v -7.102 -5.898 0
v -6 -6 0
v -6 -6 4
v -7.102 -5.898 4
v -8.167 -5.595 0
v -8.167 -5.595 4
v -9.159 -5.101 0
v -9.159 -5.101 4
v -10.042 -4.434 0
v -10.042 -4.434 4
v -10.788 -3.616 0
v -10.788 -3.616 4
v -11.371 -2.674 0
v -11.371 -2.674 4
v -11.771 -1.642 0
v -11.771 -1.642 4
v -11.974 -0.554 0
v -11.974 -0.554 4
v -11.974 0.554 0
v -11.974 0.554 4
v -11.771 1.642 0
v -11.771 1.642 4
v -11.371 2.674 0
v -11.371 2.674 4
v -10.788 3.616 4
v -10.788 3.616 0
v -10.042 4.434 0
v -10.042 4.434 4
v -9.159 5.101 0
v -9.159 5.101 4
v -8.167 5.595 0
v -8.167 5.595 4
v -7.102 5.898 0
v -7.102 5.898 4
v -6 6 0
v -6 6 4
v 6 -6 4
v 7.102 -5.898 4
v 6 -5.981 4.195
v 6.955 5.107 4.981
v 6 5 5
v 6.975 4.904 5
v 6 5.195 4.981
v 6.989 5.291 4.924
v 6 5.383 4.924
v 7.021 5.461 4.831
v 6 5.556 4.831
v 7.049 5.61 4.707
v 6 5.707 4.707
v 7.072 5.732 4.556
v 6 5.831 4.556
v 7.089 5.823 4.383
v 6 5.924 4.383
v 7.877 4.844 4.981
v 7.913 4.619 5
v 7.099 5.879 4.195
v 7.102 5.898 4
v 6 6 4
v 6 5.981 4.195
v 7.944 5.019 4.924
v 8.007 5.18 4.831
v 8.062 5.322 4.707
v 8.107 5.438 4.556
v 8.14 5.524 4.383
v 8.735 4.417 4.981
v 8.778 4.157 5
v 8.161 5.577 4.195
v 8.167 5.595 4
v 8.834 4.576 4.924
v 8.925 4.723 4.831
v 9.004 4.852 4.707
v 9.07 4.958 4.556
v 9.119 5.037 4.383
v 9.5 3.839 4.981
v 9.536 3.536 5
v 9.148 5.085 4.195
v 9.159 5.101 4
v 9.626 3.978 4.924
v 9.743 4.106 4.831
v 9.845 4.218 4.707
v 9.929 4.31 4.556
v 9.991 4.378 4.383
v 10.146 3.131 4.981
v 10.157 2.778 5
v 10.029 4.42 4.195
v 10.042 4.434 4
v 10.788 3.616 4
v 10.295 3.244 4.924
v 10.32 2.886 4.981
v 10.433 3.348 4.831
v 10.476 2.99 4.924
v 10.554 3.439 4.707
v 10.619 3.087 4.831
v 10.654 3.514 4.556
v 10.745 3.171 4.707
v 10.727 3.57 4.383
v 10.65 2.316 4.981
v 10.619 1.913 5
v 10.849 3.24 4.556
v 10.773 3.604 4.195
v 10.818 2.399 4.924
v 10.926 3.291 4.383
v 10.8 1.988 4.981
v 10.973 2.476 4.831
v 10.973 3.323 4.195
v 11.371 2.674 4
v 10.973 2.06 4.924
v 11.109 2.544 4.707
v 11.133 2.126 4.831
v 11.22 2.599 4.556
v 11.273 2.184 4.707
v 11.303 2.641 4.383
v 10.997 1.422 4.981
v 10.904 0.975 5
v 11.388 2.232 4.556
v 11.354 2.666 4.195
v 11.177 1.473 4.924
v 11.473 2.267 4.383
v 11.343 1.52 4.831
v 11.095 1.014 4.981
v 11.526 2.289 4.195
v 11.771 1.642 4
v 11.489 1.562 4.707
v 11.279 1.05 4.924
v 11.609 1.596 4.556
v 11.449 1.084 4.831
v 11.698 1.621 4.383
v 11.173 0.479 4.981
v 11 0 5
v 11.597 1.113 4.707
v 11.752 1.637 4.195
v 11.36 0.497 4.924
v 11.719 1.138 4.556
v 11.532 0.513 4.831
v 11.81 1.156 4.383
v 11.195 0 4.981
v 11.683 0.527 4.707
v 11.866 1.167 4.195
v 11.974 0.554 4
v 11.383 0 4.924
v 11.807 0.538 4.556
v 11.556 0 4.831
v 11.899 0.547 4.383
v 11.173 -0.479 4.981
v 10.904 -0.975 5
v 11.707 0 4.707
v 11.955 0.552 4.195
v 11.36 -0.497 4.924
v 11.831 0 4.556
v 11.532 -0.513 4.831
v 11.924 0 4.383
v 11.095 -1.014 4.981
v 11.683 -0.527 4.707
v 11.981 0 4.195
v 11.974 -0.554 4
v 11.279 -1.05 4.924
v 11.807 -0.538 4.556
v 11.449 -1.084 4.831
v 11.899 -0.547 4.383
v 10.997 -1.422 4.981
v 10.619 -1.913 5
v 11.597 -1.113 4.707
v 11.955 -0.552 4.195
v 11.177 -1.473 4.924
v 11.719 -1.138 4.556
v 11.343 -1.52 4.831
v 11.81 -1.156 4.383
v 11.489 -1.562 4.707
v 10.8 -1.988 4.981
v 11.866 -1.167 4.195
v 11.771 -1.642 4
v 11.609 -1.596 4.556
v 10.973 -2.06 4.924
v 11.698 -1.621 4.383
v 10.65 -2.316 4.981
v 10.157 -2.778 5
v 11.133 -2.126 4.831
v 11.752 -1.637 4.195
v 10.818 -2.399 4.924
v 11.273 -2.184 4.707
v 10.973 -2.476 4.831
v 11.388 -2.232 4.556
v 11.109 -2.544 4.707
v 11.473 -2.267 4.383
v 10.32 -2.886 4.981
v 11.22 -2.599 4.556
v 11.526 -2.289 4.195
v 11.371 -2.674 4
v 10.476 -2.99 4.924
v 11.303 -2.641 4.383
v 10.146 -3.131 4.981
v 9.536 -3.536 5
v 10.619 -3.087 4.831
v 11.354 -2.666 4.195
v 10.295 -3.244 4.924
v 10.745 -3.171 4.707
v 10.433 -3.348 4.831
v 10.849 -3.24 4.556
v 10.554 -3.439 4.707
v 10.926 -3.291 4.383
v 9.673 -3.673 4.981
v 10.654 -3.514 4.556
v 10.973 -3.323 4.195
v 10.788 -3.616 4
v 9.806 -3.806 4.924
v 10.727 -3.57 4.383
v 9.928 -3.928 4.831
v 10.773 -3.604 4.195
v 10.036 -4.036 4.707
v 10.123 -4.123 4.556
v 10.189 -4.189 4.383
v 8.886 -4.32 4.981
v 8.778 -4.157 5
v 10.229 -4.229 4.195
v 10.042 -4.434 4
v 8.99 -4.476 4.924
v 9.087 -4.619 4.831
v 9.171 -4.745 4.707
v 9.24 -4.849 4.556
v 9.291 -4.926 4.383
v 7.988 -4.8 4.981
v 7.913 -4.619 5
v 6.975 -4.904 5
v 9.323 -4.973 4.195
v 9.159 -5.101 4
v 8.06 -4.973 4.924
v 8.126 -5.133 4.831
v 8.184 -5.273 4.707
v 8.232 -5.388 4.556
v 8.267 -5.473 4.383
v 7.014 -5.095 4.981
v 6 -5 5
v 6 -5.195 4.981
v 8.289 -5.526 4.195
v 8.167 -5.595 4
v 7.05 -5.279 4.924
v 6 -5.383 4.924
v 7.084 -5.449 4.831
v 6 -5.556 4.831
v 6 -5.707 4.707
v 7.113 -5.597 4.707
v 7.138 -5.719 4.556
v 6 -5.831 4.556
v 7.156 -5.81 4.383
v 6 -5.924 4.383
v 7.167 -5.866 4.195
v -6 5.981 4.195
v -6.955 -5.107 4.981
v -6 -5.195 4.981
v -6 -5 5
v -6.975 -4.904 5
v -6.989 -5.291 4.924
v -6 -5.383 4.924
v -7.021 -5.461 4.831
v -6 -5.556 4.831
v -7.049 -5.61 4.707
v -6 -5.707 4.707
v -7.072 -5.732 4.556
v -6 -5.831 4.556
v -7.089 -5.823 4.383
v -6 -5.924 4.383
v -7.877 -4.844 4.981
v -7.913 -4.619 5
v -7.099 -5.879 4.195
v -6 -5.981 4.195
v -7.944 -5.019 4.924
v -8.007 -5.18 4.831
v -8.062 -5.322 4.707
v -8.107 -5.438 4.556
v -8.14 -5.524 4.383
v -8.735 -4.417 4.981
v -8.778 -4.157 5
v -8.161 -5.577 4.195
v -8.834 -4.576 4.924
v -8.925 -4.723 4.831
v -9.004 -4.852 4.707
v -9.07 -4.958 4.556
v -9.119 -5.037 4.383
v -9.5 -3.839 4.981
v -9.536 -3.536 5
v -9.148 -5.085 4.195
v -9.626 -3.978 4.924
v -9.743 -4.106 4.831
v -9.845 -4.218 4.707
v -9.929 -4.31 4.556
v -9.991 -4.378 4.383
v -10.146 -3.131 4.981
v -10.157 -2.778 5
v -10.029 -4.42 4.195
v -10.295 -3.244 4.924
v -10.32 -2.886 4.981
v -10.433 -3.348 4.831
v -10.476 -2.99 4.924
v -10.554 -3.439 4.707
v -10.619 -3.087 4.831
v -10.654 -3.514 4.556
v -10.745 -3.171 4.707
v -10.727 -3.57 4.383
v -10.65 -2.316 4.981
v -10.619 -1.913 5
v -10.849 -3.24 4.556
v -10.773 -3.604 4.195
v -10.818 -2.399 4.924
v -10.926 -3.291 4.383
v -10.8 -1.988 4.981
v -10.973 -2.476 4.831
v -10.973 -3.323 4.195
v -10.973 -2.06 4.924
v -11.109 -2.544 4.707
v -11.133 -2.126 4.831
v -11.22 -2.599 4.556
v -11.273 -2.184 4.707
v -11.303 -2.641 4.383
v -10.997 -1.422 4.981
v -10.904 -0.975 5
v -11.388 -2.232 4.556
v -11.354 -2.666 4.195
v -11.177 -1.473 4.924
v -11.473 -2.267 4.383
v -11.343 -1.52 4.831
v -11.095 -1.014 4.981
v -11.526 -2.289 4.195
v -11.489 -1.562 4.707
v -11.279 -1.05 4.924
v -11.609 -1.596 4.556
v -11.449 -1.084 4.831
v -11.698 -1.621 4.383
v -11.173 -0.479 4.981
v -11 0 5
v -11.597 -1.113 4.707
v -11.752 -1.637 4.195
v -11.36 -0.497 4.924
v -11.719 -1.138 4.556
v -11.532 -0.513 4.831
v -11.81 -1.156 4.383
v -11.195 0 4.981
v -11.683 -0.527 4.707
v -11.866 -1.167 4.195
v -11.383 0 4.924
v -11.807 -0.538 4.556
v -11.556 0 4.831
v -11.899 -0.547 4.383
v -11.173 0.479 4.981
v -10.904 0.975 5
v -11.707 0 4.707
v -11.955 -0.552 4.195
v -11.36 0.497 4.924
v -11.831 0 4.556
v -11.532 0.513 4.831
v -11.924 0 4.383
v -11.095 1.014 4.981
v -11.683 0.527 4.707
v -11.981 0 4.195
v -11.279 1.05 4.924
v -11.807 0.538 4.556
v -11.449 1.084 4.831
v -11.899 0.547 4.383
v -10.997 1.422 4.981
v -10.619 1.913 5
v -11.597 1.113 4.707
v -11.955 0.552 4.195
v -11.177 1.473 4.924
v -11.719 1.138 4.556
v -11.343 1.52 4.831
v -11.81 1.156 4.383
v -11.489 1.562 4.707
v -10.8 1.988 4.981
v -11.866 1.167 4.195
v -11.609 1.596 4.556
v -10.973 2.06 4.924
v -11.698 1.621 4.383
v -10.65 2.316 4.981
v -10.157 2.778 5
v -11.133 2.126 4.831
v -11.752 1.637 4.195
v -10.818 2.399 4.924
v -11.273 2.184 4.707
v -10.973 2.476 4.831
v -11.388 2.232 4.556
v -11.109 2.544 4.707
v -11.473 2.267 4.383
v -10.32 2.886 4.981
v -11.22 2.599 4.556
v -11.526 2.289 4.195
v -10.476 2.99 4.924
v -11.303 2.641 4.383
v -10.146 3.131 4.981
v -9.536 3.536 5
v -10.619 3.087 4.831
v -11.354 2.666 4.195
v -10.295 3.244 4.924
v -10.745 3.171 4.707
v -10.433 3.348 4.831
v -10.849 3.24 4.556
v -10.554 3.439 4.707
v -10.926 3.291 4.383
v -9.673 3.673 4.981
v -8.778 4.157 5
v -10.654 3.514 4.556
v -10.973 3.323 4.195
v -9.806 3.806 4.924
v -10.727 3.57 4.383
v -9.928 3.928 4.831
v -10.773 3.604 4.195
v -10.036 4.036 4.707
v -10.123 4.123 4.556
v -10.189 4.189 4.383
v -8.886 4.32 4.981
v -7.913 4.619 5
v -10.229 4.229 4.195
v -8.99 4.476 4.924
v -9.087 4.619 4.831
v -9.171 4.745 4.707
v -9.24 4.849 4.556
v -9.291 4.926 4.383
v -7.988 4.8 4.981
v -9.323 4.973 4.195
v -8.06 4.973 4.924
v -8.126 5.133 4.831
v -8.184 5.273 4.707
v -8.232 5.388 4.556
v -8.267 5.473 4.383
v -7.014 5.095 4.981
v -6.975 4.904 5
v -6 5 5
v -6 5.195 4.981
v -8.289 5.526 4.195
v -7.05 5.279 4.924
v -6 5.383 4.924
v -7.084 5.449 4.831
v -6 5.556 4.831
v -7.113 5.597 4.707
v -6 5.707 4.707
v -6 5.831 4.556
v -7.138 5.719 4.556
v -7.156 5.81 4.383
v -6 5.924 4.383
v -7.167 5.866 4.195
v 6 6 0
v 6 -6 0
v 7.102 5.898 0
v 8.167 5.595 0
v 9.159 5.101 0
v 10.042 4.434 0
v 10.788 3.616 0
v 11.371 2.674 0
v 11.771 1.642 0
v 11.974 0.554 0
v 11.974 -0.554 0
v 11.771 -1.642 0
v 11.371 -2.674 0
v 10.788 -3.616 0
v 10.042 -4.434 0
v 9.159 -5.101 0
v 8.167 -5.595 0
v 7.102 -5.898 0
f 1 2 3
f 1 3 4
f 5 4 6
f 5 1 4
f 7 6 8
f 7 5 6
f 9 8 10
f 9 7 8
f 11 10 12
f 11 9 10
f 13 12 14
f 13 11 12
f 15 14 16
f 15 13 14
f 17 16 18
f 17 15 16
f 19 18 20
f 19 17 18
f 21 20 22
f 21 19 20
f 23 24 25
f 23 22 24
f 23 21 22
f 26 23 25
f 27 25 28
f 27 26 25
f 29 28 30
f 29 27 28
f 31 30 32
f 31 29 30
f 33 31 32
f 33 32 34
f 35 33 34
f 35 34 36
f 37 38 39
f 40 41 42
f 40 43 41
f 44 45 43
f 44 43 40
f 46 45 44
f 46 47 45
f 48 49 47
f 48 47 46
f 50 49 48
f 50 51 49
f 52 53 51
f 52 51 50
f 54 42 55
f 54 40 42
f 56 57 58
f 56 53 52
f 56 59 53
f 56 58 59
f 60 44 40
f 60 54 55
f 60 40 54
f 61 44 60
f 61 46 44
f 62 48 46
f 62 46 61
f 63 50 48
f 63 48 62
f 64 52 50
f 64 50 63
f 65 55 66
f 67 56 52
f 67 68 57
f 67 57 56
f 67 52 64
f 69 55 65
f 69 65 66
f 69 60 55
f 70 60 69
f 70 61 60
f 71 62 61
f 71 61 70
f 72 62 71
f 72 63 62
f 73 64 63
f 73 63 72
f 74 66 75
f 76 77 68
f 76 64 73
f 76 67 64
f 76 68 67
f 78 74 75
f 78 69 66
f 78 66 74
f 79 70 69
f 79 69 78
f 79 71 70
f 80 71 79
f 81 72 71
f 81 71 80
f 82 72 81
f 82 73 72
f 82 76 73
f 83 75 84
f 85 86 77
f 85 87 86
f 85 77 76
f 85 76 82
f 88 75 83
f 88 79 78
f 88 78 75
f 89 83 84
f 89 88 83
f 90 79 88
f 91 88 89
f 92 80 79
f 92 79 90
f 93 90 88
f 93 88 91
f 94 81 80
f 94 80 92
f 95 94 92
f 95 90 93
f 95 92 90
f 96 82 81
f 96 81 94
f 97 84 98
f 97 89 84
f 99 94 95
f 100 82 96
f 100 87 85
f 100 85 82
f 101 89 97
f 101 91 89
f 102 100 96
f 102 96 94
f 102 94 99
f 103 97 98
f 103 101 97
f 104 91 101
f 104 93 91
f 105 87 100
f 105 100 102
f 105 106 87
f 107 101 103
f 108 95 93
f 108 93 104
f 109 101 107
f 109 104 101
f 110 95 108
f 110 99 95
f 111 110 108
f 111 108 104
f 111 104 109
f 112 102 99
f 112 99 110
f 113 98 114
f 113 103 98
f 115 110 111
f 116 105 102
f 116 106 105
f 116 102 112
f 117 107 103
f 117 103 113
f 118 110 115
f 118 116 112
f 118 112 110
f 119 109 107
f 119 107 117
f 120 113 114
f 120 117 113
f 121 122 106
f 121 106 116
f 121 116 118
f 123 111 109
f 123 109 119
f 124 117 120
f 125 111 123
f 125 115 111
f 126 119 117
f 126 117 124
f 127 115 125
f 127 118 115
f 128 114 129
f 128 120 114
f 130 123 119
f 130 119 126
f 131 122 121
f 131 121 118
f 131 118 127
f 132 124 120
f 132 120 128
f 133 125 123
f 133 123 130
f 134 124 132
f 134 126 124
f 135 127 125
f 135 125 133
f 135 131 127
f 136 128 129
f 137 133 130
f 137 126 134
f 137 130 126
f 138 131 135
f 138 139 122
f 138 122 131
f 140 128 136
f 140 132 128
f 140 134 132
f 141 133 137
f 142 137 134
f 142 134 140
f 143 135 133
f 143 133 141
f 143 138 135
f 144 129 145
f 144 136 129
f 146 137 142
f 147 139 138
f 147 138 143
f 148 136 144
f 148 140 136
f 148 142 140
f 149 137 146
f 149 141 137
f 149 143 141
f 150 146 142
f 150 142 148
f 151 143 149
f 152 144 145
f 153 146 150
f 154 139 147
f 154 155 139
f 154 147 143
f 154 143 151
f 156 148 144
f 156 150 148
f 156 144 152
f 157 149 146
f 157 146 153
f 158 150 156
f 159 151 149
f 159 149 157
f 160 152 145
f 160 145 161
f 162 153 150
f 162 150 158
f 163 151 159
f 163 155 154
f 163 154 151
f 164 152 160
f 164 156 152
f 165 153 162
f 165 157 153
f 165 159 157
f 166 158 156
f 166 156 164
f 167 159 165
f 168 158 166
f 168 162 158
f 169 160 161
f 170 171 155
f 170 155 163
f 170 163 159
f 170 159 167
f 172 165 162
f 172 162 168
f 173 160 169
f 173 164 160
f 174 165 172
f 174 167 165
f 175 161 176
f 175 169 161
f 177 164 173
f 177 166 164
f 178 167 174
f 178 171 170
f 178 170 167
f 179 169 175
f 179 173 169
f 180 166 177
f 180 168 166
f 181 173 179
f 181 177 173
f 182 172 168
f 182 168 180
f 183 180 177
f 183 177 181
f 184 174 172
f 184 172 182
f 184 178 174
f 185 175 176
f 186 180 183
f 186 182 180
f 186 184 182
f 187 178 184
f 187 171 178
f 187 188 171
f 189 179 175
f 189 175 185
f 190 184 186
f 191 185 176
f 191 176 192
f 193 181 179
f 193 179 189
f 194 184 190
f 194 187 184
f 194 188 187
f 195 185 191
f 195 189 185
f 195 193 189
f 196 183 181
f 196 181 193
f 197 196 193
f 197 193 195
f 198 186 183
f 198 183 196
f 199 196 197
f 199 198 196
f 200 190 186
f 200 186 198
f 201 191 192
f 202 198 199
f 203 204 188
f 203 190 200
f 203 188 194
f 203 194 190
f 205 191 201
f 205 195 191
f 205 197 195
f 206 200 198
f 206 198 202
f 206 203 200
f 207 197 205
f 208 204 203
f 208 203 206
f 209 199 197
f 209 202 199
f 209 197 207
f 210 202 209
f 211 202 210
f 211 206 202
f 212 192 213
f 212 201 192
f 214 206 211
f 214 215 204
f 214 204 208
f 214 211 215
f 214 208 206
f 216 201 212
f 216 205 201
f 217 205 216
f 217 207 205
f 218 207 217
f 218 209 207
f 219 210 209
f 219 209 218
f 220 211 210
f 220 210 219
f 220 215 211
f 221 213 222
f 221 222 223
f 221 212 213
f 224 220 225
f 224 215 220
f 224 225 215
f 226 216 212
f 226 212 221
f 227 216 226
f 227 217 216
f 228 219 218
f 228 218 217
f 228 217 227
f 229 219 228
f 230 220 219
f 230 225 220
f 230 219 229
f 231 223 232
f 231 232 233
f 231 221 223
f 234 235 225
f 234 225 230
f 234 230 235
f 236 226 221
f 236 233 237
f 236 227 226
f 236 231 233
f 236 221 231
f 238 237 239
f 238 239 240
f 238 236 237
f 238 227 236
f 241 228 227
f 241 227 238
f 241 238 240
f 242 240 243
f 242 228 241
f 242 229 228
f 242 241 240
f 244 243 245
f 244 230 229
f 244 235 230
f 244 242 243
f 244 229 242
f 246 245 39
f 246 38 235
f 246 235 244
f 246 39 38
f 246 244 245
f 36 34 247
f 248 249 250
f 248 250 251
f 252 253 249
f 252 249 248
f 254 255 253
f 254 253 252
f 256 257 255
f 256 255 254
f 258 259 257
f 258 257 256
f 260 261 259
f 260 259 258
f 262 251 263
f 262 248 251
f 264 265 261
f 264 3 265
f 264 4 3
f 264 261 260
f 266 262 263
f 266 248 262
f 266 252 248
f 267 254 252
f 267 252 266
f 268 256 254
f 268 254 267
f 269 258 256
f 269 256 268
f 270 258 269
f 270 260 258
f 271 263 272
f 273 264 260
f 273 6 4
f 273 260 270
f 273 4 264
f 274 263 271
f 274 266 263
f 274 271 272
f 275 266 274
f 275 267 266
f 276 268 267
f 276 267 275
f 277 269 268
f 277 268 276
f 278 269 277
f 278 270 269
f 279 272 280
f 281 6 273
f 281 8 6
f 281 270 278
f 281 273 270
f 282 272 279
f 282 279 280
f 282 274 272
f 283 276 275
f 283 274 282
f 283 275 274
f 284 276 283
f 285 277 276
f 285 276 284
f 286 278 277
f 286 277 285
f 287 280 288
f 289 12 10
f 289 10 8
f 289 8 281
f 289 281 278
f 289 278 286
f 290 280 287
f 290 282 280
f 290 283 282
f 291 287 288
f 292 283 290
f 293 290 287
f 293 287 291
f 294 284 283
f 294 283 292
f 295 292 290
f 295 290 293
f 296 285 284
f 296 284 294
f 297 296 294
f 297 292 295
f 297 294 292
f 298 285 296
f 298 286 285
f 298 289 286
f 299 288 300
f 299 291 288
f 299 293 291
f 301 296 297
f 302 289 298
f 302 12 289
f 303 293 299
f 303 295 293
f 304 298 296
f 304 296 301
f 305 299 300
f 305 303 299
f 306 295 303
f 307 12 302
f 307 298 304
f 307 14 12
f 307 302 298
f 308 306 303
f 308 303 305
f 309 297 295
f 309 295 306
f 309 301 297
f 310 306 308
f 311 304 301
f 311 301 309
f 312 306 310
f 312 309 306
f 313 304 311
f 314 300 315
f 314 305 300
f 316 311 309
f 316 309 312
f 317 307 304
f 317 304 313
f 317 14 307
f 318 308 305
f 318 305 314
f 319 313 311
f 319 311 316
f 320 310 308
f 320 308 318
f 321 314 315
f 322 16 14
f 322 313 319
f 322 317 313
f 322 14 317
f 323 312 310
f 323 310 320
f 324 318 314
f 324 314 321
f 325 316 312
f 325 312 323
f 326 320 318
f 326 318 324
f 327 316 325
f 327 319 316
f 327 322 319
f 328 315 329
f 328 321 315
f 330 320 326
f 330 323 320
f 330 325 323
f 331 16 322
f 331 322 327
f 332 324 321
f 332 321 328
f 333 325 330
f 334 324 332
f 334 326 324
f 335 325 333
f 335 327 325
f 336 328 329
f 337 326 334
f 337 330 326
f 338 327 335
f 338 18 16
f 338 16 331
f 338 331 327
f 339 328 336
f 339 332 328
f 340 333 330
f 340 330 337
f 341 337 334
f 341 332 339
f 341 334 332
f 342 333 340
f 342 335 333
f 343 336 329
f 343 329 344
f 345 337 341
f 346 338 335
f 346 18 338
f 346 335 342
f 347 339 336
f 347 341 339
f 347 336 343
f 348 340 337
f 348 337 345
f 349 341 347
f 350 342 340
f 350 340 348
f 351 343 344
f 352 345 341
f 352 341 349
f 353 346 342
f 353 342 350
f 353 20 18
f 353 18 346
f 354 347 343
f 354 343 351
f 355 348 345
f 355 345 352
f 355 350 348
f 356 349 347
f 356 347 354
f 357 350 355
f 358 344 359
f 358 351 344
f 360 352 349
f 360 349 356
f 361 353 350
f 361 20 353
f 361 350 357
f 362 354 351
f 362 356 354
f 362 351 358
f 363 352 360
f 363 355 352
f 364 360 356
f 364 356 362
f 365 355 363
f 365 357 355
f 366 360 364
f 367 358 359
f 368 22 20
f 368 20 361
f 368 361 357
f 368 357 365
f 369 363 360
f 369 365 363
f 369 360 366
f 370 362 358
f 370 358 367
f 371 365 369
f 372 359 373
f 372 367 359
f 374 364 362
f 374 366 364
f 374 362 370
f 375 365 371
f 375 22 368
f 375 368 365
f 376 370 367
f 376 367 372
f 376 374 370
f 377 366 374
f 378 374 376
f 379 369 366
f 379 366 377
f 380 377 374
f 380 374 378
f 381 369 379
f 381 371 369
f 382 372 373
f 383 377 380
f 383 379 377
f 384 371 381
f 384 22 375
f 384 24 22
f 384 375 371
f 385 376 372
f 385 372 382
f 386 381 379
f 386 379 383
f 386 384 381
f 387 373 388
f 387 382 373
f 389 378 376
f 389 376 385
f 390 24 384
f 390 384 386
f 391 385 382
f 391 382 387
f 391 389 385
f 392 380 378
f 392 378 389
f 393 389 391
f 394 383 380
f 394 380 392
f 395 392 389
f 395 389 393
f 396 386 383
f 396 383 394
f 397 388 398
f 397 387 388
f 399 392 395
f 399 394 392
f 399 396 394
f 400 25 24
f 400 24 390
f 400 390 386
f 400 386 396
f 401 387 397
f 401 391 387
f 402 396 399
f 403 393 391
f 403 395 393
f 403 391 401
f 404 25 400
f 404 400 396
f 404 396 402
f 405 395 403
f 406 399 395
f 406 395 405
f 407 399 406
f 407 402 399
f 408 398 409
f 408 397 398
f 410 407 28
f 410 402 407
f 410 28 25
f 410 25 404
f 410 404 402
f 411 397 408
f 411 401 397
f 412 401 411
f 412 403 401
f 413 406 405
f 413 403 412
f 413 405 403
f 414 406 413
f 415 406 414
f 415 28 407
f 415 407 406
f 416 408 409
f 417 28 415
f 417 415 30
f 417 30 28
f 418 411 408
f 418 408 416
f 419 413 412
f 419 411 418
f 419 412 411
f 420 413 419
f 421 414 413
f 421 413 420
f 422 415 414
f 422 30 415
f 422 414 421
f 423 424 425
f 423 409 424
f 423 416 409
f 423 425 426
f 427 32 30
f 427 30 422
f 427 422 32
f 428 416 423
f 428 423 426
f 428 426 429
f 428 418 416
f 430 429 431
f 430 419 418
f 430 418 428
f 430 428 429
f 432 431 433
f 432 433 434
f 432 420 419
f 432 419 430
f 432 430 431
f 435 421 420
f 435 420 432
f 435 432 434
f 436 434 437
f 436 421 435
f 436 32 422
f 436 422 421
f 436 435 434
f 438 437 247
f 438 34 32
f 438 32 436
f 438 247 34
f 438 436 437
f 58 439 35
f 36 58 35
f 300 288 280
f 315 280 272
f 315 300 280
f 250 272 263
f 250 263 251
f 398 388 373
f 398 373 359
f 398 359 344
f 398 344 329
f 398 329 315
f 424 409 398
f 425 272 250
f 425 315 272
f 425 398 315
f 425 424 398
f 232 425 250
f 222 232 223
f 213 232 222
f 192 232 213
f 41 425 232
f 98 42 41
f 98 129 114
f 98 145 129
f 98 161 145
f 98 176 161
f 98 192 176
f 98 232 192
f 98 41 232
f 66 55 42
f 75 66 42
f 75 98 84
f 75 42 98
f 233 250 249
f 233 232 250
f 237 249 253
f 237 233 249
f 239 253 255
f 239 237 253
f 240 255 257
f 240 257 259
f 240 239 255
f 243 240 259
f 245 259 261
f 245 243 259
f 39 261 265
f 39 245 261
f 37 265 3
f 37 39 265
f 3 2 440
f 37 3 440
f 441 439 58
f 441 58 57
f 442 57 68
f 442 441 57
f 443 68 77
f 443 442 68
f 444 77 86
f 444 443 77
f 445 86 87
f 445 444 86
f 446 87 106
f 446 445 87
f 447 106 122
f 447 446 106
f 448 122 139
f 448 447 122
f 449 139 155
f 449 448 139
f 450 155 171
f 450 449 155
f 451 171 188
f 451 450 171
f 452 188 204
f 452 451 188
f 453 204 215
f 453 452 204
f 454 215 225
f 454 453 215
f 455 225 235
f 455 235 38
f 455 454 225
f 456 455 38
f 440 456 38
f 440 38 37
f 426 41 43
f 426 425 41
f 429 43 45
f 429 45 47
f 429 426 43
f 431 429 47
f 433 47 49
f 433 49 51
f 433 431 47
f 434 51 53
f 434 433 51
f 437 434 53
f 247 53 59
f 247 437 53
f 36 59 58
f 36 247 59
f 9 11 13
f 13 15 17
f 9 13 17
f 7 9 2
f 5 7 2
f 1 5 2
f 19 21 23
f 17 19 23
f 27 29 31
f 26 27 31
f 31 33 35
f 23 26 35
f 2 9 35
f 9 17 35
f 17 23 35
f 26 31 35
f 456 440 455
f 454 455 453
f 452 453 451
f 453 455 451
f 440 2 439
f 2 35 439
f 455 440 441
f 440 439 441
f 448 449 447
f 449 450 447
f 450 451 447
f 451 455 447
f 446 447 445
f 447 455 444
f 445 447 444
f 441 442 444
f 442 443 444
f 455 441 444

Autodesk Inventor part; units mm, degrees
ref_plane "YZ Plane" through (0, 0, 0) normal (1, 0, 0) x (0, 1, 0)
ref_plane "XZ Plane" through (0, 0, 0) normal (0, 1, 0) x (-1, 0, 0)
ref_plane "XY Plane" through (0, 0, 0) normal (0, 0, 1) x (1, 0, 0)
sketch "Sketch1" plane through (0, 0, 0) normal (0, 0, 1) x (1, 0, 0)
  line L0 (-14.4, 0) -> (2.4, 0) projected
  line L1 (0, -8.4) -> (0, 8.4) projected
  line L2 (0, 6) -> (-6, 6)
  line L3 (-6, 6) -> (-6, -6)
  line L4 (-6, -6) -> (0, -6)
  line L5 (0, -6) -> (0, 6)
  arc A0 (-6, 6) -> (-6, -6) centre (-6, 0) ccw
  point P0 (0, 0)
  dimension "d0" = 12
  dimension "d1" = 6
extrude "Extrusion1" add sketch "Sketch1" along normal blind 5
fillet "Fillet1" radius 1 3 edges at (-3, -6, 5) (-3, 6, 5) (-12, 0, 5)
mirror "Mirror1" about plane through (0, -6, 0) normal (1, 0, 0)
properties part number "F113" material "ABS Plastic"
